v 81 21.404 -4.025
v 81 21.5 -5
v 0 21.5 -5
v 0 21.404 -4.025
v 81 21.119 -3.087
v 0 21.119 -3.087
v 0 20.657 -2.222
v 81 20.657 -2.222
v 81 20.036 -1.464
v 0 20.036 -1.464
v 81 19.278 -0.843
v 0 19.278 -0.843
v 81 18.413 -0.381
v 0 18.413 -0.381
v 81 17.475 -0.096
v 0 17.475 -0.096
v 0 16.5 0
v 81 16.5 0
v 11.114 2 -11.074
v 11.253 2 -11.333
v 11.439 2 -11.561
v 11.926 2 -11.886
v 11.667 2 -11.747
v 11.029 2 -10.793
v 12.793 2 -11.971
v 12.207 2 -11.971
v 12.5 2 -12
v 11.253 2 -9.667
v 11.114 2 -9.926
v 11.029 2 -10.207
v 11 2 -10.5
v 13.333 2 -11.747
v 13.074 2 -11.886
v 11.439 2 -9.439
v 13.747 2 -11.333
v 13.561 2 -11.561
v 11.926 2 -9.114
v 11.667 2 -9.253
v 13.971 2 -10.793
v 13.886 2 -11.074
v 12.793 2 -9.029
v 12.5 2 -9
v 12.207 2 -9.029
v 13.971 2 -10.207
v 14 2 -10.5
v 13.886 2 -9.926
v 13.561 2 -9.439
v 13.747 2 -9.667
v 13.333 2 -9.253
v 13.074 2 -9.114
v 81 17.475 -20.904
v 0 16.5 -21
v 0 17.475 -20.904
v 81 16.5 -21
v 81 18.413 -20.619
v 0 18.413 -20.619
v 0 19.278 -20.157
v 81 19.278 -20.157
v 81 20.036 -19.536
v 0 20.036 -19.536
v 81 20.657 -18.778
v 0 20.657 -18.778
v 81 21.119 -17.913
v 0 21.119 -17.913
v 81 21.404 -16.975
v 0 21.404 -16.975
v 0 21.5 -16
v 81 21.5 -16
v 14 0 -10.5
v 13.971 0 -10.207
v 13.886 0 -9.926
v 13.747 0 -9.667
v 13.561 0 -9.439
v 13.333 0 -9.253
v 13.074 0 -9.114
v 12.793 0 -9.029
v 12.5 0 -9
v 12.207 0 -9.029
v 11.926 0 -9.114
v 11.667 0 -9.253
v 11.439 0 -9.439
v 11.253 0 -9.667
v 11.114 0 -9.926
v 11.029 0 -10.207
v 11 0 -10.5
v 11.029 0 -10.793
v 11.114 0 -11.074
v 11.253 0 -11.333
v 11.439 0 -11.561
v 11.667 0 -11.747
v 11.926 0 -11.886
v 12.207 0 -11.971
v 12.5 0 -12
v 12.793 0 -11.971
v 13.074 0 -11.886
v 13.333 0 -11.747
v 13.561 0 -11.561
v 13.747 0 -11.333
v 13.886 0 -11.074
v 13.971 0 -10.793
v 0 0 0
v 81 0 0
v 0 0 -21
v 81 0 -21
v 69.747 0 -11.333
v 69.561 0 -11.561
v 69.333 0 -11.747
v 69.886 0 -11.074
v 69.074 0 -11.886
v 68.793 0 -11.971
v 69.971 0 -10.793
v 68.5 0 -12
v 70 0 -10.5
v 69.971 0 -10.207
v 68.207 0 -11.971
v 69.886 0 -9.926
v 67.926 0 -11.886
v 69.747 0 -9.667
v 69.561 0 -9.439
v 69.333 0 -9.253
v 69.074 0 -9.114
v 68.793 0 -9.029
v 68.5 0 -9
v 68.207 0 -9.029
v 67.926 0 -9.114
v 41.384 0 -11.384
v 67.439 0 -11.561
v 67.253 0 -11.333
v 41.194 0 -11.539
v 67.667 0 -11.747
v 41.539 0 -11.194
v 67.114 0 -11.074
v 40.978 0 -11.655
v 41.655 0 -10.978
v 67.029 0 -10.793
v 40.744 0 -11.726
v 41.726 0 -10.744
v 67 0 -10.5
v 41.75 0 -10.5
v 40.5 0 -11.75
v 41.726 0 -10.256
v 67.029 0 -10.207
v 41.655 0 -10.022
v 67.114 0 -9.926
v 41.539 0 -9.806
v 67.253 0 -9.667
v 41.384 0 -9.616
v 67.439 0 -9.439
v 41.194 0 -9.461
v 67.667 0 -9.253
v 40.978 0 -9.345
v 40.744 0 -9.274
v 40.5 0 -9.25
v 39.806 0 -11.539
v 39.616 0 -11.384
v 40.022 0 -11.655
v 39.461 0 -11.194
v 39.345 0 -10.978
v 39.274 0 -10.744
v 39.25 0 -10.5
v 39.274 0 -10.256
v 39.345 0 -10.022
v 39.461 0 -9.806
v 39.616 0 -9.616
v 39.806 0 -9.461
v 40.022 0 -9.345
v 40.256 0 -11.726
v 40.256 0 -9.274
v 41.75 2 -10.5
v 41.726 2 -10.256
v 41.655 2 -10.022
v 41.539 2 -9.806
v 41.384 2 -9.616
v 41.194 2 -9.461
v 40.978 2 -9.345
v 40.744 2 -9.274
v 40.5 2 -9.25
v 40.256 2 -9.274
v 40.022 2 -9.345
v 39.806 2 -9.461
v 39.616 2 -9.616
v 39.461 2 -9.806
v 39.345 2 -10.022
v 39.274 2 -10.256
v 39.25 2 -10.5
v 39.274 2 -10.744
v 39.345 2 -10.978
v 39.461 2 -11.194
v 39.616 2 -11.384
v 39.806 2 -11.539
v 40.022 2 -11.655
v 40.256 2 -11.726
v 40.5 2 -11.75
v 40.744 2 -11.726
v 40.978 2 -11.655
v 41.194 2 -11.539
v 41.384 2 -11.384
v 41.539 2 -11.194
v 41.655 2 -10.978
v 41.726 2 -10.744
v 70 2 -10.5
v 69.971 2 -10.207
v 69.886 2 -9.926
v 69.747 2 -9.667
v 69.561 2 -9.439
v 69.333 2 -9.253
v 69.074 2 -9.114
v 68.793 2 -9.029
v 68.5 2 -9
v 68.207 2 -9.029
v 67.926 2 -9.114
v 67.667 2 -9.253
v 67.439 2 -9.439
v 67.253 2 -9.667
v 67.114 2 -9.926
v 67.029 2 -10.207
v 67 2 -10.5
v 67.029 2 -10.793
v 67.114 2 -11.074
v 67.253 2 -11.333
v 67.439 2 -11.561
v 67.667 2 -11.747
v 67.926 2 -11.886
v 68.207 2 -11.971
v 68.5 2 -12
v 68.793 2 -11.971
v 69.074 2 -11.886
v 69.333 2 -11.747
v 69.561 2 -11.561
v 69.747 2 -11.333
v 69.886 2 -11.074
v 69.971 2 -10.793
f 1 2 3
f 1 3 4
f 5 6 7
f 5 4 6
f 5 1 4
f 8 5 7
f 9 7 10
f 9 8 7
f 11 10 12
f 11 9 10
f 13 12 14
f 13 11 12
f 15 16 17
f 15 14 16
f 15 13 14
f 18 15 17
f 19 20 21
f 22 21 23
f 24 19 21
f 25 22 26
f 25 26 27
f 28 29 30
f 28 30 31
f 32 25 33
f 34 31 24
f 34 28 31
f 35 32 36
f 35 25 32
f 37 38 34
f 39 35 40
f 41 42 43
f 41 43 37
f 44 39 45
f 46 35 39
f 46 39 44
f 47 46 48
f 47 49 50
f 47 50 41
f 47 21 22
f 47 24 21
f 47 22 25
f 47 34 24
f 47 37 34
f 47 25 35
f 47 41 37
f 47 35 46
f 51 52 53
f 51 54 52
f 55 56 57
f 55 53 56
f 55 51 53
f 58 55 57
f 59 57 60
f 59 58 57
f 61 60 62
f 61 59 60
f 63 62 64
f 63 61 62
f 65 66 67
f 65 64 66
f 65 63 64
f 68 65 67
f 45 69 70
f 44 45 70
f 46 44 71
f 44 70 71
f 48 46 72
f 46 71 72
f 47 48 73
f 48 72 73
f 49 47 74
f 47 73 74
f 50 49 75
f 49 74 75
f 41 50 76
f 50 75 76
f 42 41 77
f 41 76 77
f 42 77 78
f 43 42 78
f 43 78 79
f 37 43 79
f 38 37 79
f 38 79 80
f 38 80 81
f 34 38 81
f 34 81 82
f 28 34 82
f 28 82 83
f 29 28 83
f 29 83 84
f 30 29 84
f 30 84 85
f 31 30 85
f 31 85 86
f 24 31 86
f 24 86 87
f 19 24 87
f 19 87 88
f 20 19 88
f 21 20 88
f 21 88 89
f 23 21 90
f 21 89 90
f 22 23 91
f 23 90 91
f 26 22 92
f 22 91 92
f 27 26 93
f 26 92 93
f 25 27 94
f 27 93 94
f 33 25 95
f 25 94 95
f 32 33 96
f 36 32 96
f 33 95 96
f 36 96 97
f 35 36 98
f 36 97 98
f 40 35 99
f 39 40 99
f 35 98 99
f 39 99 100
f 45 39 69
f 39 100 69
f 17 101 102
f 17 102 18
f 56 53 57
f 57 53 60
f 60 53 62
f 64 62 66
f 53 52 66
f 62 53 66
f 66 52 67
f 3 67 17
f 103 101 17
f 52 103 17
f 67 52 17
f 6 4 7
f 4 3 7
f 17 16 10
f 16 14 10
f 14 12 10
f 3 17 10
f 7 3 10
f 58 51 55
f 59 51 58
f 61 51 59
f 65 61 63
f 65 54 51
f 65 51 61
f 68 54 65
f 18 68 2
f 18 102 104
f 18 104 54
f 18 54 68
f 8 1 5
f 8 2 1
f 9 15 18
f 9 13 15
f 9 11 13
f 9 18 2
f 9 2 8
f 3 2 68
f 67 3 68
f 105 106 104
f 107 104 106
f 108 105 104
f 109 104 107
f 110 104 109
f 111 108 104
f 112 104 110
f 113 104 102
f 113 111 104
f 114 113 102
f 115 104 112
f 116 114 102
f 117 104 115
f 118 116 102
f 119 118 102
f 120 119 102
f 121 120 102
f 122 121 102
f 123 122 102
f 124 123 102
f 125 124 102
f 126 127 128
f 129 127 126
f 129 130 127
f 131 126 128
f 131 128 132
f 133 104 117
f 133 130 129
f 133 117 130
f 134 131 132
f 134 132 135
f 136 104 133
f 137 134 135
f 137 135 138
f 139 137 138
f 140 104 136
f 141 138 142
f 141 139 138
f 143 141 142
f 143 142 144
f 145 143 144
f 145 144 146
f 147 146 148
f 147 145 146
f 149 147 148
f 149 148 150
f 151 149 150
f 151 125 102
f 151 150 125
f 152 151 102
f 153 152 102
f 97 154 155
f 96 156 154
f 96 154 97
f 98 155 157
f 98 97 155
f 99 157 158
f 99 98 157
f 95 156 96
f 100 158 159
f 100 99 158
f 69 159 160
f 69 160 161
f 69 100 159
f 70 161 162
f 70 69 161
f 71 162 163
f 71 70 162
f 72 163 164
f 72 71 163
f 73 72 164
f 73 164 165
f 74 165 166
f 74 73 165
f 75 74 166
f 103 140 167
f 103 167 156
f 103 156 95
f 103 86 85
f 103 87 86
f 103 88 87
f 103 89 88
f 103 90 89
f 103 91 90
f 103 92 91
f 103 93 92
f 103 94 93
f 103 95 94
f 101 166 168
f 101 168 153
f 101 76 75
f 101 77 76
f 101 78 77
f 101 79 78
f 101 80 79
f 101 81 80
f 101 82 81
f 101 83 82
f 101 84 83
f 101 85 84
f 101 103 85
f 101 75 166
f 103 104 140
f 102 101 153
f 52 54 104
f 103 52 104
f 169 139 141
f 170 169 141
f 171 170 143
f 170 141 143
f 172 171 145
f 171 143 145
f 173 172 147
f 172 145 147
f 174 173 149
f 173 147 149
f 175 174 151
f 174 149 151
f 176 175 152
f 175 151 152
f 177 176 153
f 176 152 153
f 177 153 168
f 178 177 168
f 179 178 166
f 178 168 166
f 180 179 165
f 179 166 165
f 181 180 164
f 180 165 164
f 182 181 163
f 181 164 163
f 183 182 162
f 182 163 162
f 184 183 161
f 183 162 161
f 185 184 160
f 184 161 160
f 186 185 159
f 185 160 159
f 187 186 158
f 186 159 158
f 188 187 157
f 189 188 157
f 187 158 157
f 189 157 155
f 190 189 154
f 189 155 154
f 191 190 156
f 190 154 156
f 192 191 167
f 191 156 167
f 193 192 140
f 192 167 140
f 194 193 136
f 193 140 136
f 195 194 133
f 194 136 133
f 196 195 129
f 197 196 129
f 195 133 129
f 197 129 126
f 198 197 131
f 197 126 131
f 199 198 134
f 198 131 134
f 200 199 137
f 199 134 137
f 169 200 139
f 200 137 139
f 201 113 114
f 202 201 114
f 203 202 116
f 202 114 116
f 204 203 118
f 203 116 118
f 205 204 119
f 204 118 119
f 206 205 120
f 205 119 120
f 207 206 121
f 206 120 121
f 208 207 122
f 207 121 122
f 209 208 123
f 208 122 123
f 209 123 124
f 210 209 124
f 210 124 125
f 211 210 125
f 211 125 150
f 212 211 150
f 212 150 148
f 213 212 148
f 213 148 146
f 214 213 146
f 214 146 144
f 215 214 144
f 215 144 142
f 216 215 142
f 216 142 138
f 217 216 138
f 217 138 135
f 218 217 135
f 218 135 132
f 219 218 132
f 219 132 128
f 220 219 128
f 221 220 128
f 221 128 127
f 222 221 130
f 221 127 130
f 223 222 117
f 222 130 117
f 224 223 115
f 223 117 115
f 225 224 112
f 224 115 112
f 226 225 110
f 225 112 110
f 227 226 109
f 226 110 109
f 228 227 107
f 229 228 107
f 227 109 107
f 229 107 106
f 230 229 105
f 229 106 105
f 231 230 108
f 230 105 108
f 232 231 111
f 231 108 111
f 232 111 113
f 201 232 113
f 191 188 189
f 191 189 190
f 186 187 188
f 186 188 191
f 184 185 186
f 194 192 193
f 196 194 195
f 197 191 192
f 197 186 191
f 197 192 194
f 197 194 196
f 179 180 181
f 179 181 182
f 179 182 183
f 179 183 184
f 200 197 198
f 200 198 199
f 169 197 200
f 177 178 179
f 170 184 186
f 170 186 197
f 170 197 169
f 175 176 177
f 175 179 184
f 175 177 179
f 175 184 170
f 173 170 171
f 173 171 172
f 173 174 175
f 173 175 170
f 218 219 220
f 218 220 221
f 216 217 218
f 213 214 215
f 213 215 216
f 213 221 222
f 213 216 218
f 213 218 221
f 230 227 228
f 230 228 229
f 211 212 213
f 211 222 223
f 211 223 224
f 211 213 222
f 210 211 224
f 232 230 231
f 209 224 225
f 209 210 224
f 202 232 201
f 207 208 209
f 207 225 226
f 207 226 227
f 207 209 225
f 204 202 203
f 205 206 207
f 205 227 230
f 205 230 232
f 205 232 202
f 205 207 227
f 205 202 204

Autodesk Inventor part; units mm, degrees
ref_plane "YZ Plane" through (0, 0, 0) normal (1, 0, 0) x (0, 1, 0)
ref_plane "XZ Plane" through (0, 0, 0) normal (0, 1, 0) x (-1, 0, 0)
ref_plane "XY Plane" through (0, 0, 0) normal (0, 0, 1) x (1, 0, 0)
sketch "스케치1" plane through (0, 0, 0) normal (1, 0, 0) x (0, 1, 0)
  line L0 (0, 0) -> (21.5, 0)
  line L1 (21.5, 0) -> (21.5, -21)
  line L2 (21.5, -21) -> (0, -21)
  line L3 (0, -21) -> (0, 0)
  dimension "d0" = 21.5
  dimension "d1" = 21
extrude "돌출1" add sketch "스케치1" along normal blind 81
fillet "모깎기1" radius 5 2 edges at (40.5, 21.5, 0) (40.5, 21.5, -21)
sketch "스케치2" plane through (0, 0, -21) normal (0, -1, 0) x (1, 0, 0)
  point P0 (0, 21)
sketch "스케치3" plane through (0, 0, -21) normal (0, -1, 0) x (1, 0, 0)
  line L0 (0, 0) -> (81, 0) projected
  line L1 (40.5, 0) -> (40.5, 10.5)
  line L2 (0, 21) -> (81, 21) projected
  circle A0 centre (40.5, 10.5) radius 1.25
  line L3 (40.5, 10.5) -> (68.5, 10.5)
  circle A1 centre (68.5, 10.5) radius 1.5
  line L4 (40.5, 10.5) -> (12.5, 10.5)
  circle A2 centre (12.5, 10.5) radius 1.5
  dimension "d5" = 10.5
  dimension "d6" = 2.5
  dimension "d7" = 28
  dimension "d8" = 3
  dimension "d9" = 28
  dimension "d10" = 3
extrude "돌출2" cut sketch "스케치3" against normal blind 2
properties part number "배터리+홀더"
